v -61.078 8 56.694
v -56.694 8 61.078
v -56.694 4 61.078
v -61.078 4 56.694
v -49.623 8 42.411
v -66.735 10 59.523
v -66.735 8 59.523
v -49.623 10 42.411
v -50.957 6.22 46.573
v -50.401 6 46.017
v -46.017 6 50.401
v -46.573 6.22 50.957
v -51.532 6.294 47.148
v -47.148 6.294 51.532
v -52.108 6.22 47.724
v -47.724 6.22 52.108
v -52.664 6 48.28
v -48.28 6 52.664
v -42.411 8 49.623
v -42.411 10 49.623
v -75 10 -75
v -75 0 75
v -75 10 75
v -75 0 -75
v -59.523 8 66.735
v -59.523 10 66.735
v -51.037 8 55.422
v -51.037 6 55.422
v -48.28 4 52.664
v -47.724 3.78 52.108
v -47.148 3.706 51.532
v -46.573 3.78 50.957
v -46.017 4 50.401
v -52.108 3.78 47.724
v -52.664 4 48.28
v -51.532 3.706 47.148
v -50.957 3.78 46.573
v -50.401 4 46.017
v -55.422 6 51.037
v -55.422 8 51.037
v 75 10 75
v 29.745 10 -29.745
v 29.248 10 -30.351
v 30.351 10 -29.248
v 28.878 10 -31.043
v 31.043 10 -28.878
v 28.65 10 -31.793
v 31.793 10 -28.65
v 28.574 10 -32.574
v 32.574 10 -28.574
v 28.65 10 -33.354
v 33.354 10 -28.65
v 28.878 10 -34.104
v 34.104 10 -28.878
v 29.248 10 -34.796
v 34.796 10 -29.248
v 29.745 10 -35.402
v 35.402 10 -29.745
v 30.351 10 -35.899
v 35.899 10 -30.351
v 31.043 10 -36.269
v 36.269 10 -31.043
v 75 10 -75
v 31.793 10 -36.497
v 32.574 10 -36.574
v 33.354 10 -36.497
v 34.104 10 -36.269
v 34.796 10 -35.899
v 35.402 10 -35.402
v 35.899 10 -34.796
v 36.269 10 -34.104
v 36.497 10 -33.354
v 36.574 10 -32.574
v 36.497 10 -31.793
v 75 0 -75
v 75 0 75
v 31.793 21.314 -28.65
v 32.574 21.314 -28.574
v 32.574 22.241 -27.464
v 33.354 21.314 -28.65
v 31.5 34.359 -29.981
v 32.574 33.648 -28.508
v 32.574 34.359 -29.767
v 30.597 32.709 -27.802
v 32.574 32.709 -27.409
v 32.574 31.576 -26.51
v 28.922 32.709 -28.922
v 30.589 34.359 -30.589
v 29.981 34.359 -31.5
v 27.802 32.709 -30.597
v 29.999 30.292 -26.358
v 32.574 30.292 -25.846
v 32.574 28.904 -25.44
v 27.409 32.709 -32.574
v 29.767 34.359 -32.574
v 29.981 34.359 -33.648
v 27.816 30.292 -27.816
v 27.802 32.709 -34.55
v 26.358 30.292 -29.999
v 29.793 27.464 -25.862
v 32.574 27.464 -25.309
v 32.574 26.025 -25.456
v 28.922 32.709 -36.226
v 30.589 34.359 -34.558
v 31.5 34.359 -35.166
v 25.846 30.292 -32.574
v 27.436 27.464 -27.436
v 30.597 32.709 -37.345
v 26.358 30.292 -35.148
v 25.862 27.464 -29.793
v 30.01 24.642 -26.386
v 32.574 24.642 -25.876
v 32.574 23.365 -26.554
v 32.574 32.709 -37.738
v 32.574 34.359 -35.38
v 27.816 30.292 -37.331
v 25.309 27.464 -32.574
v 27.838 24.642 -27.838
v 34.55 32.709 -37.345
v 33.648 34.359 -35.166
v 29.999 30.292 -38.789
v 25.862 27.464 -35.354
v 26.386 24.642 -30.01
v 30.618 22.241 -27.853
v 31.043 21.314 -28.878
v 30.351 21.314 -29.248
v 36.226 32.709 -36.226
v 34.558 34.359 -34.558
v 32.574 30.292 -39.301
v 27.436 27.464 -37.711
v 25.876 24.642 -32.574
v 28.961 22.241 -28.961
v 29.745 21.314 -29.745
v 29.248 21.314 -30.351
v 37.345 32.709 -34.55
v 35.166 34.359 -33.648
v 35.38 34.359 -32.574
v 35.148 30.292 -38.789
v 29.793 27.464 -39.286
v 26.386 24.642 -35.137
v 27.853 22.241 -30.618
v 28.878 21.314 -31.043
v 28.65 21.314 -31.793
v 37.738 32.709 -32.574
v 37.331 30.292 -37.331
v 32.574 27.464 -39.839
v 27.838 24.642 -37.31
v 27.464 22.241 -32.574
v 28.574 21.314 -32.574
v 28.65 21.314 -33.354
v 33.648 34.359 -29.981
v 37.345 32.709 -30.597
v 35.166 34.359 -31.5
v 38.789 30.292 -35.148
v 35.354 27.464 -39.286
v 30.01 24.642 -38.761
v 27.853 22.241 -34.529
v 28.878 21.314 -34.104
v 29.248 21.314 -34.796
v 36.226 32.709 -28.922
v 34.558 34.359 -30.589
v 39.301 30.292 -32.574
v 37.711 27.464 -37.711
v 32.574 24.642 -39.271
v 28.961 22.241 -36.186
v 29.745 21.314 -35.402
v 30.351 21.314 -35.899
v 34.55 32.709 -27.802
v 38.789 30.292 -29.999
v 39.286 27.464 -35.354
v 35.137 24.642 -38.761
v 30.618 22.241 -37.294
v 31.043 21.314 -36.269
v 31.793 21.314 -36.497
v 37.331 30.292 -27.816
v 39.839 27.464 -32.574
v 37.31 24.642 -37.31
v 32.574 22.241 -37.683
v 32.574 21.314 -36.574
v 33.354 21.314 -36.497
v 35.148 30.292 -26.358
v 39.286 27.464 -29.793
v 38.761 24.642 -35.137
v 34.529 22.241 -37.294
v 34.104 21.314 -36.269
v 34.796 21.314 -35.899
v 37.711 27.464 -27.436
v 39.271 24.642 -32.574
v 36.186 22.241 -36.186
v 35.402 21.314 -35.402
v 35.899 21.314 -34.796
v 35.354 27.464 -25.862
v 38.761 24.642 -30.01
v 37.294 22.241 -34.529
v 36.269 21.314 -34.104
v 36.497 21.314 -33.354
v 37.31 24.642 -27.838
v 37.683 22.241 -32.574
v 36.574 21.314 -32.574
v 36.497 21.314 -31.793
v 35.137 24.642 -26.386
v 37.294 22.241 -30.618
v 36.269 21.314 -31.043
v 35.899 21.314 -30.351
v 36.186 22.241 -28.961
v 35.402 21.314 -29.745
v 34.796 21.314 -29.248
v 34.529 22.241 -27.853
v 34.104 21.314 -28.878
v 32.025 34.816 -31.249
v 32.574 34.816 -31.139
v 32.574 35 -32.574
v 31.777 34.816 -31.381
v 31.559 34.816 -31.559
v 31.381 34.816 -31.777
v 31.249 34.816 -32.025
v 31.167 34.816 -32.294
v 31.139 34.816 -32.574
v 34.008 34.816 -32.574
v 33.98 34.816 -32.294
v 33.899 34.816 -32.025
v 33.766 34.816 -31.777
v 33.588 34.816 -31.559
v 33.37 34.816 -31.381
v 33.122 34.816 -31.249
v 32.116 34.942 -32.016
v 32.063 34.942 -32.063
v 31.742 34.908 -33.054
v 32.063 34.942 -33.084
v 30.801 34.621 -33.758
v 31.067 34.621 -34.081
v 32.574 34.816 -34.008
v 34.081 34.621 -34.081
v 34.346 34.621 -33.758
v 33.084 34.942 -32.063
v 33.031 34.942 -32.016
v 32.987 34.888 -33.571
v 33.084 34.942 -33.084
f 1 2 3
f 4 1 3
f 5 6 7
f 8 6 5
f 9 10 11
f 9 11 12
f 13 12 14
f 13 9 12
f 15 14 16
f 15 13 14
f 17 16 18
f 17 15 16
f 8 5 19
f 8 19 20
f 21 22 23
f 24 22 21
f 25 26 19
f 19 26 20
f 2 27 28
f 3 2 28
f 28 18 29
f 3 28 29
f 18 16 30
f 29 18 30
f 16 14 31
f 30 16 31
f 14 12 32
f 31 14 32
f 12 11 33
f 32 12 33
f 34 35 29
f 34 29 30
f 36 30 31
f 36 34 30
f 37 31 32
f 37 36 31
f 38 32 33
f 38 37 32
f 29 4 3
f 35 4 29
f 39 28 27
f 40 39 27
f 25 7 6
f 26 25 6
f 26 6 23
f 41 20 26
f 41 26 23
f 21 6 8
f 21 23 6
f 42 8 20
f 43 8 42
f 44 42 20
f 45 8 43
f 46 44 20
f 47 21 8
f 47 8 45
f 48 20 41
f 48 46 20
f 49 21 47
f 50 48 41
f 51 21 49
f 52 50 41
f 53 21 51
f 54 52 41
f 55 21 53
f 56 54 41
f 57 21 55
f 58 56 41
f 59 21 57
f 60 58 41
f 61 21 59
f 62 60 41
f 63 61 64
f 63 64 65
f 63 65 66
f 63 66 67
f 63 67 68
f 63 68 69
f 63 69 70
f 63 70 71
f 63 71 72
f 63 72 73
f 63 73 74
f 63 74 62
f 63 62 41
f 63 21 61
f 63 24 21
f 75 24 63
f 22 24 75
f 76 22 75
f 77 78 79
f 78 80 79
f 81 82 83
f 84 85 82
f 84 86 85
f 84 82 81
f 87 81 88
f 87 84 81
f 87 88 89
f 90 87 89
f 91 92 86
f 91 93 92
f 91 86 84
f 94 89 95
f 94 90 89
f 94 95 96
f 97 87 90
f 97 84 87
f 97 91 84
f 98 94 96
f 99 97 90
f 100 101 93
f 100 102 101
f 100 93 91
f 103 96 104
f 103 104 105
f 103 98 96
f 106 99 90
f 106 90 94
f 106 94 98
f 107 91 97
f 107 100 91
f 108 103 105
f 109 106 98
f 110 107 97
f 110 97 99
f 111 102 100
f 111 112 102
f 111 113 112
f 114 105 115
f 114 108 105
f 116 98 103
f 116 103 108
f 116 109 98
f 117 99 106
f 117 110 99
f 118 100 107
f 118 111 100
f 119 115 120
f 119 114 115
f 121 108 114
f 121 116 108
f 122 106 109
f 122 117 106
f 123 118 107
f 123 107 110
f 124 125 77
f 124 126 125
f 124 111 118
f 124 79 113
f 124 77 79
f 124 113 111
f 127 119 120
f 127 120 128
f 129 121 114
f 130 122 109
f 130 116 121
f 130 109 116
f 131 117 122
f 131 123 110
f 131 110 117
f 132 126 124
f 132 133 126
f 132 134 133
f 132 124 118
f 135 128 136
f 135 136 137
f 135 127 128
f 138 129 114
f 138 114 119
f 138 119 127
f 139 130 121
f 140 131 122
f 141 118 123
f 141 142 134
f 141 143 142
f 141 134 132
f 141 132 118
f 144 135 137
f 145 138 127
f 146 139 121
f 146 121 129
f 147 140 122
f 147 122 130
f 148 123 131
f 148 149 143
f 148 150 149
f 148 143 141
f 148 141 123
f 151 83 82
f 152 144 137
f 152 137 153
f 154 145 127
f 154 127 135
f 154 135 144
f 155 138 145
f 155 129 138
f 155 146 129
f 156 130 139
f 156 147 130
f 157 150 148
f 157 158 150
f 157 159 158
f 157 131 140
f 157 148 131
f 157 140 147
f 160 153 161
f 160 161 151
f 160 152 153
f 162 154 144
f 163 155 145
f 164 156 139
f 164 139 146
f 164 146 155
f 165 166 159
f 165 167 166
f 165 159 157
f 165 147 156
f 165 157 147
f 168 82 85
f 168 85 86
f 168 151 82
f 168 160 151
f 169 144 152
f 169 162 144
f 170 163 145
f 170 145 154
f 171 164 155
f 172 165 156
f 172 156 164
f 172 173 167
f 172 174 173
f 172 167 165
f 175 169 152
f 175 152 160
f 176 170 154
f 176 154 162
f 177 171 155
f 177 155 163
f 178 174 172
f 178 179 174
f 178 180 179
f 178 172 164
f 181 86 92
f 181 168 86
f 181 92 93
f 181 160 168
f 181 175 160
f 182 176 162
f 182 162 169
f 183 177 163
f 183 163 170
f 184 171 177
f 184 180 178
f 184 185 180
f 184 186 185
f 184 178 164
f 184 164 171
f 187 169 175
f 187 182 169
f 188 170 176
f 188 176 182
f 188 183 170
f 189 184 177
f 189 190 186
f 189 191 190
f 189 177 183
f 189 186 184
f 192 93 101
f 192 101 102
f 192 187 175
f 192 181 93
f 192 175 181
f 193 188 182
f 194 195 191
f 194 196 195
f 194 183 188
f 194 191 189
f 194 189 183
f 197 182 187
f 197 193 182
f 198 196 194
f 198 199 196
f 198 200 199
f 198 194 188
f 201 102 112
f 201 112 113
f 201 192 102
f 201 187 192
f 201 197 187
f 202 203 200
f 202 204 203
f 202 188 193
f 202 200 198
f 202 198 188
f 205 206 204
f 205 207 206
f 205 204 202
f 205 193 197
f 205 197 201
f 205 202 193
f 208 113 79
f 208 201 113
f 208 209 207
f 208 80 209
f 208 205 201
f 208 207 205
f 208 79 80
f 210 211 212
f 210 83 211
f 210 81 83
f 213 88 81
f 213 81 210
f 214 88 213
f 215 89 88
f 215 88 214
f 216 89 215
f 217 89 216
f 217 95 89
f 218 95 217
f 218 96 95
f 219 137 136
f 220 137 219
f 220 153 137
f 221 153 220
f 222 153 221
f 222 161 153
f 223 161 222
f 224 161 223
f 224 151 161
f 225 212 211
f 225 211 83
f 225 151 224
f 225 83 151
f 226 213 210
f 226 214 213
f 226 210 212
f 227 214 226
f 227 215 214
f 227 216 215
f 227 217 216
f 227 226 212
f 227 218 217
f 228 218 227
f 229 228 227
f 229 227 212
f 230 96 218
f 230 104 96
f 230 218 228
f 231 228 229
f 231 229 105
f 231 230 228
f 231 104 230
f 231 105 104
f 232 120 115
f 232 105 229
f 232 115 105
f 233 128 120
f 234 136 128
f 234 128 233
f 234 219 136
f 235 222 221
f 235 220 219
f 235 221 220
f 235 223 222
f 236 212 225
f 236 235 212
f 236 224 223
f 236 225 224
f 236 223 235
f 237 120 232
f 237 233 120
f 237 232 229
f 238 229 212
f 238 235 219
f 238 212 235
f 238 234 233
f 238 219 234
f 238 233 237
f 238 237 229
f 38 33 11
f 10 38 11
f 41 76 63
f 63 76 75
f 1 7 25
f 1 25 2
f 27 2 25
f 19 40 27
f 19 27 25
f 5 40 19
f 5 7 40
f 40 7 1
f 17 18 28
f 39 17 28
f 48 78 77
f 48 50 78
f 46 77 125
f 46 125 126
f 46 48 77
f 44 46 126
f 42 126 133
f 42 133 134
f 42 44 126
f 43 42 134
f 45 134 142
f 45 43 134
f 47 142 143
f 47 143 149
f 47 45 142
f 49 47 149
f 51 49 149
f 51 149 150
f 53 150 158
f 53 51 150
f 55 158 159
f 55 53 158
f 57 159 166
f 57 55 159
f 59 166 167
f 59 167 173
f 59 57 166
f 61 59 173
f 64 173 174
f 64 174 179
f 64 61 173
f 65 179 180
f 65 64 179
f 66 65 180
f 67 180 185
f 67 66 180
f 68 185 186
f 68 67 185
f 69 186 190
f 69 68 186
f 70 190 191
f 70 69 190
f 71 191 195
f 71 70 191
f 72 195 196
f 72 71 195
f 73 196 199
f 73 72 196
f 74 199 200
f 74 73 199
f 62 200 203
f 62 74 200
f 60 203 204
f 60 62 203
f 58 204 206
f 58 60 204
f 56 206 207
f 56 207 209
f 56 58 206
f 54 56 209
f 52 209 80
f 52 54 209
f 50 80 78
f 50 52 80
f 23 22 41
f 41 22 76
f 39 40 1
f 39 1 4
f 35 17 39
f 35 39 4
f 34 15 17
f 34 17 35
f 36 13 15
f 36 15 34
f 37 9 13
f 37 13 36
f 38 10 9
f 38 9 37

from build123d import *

# Parameters (mm, degrees)
SKETCH1_W               = 150
SKETCH1_H               = 150
BOSS_EXTRUDE1_DEPTH     = 10
CUT_EXTRUDE1_DEPTH      = 3.1
CUT_EXTRUDE1_DEPTH_BACK = 3.1
CUT_EXTRUDE2_DEPTH      = 8.2
CUT_EXTRUDE2_DEPTH_BACK = 2
SKETCH4_W               = 24.2
SKETCH4_H               = 2


with BuildPart() as part:
    # Sketch1 → Boss-Extrude1 (new body)
    with BuildSketch(Plane(origin=(0, 0, 0), x_dir=(1, 0, 0), z_dir=(0, 1, 0))):
        Rectangle(SKETCH1_W, SKETCH1_H)
    extrude(amount=BOSS_EXTRUDE1_DEPTH)

    # Sketch3 → Cut-Extrude1 (cut, two sides: drawn at the far end of the back side and taken through both)
    with BuildSketch(Plane(origin=(0, 0, 0), x_dir=(0, -1, 0), z_dir=(0.7071067811865488, 0, 0.7071067811865464)).offset(-CUT_EXTRUDE1_DEPTH_BACK)):
        with BuildLine():
            Line((-4, -68.177876041), (-6, -68.177876041))
            ThreePointArc((-6, -68.177876041), (-6.294051831, -69.777876041), (-6, -71.377876041))
            Line((-6, -71.377876041), (-6, -75.277876041))
            Line((-6, -75.277876041), (-8, -75.277876041))
            Line((-8, -75.277876041), (-8, -65.077876041))
            Line((-8, -65.077876041), (-10, -65.077876041))
            Line((-10, -65.077876041), (-10, -89.277876041))
            Line((-10, -89.277876041), (-8, -89.277876041))
            Line((-8, -89.277876041), (-8, -83.277876041))
            Line((-8, -83.277876041), (-4, -83.277876041))
            Line((-4, -83.277876041), (-4, -71.377876041))
            ThreePointArc((-4, -71.377876041), (-3.705948169, -69.777876041), (-4, -68.177876041))
        make_face()
    extrude(amount=CUT_EXTRUDE1_DEPTH + CUT_EXTRUDE1_DEPTH_BACK, mode=Mode.SUBTRACT)

    # Sketch4 → Cut-Extrude2 (cut, two sides: drawn at the far end of the back side and taken through both)
    with BuildSketch(Plane(origin=(-2.192031022, 0, -2.192031022), x_dir=(0.7071067811865465, 0, -0.7071067811865487), z_dir=(0.7071067811865487, 0, 0.7071067811865465)).offset(-CUT_EXTRUDE2_DEPTH_BACK)):
        with Locations((-77.177876041, 9)):
            Rectangle(SKETCH4_W, SKETCH4_H)
    extrude(amount=CUT_EXTRUDE2_DEPTH + CUT_EXTRUDE2_DEPTH_BACK, mode=Mode.SUBTRACT)

    # Sketch5 → Revolve1 (revolve)
    with BuildSketch(Plane(origin=(0, 0, 0), x_dir=(0, -1, 0), z_dir=(0.7071067811865488, 0, 0.7071067811865464))):
        with BuildLine():
            Line((-10, 46.066017178), (-35, 46.066017178))
            ThreePointArc((-35, 46.066017178), (-29.607626316, 53.030055538), (-21.31365255, 50.066017178))
            Line((-21.31365255, 50.066017178), (-10, 50.066017178))
            Line((-10, 50.066017178), (-10, 46.066017178))
        make_face()
    revolve(axis=Axis((32.573593129, 36.96807126, -32.573593129), (0, -1, 0)))


solid = part.part
